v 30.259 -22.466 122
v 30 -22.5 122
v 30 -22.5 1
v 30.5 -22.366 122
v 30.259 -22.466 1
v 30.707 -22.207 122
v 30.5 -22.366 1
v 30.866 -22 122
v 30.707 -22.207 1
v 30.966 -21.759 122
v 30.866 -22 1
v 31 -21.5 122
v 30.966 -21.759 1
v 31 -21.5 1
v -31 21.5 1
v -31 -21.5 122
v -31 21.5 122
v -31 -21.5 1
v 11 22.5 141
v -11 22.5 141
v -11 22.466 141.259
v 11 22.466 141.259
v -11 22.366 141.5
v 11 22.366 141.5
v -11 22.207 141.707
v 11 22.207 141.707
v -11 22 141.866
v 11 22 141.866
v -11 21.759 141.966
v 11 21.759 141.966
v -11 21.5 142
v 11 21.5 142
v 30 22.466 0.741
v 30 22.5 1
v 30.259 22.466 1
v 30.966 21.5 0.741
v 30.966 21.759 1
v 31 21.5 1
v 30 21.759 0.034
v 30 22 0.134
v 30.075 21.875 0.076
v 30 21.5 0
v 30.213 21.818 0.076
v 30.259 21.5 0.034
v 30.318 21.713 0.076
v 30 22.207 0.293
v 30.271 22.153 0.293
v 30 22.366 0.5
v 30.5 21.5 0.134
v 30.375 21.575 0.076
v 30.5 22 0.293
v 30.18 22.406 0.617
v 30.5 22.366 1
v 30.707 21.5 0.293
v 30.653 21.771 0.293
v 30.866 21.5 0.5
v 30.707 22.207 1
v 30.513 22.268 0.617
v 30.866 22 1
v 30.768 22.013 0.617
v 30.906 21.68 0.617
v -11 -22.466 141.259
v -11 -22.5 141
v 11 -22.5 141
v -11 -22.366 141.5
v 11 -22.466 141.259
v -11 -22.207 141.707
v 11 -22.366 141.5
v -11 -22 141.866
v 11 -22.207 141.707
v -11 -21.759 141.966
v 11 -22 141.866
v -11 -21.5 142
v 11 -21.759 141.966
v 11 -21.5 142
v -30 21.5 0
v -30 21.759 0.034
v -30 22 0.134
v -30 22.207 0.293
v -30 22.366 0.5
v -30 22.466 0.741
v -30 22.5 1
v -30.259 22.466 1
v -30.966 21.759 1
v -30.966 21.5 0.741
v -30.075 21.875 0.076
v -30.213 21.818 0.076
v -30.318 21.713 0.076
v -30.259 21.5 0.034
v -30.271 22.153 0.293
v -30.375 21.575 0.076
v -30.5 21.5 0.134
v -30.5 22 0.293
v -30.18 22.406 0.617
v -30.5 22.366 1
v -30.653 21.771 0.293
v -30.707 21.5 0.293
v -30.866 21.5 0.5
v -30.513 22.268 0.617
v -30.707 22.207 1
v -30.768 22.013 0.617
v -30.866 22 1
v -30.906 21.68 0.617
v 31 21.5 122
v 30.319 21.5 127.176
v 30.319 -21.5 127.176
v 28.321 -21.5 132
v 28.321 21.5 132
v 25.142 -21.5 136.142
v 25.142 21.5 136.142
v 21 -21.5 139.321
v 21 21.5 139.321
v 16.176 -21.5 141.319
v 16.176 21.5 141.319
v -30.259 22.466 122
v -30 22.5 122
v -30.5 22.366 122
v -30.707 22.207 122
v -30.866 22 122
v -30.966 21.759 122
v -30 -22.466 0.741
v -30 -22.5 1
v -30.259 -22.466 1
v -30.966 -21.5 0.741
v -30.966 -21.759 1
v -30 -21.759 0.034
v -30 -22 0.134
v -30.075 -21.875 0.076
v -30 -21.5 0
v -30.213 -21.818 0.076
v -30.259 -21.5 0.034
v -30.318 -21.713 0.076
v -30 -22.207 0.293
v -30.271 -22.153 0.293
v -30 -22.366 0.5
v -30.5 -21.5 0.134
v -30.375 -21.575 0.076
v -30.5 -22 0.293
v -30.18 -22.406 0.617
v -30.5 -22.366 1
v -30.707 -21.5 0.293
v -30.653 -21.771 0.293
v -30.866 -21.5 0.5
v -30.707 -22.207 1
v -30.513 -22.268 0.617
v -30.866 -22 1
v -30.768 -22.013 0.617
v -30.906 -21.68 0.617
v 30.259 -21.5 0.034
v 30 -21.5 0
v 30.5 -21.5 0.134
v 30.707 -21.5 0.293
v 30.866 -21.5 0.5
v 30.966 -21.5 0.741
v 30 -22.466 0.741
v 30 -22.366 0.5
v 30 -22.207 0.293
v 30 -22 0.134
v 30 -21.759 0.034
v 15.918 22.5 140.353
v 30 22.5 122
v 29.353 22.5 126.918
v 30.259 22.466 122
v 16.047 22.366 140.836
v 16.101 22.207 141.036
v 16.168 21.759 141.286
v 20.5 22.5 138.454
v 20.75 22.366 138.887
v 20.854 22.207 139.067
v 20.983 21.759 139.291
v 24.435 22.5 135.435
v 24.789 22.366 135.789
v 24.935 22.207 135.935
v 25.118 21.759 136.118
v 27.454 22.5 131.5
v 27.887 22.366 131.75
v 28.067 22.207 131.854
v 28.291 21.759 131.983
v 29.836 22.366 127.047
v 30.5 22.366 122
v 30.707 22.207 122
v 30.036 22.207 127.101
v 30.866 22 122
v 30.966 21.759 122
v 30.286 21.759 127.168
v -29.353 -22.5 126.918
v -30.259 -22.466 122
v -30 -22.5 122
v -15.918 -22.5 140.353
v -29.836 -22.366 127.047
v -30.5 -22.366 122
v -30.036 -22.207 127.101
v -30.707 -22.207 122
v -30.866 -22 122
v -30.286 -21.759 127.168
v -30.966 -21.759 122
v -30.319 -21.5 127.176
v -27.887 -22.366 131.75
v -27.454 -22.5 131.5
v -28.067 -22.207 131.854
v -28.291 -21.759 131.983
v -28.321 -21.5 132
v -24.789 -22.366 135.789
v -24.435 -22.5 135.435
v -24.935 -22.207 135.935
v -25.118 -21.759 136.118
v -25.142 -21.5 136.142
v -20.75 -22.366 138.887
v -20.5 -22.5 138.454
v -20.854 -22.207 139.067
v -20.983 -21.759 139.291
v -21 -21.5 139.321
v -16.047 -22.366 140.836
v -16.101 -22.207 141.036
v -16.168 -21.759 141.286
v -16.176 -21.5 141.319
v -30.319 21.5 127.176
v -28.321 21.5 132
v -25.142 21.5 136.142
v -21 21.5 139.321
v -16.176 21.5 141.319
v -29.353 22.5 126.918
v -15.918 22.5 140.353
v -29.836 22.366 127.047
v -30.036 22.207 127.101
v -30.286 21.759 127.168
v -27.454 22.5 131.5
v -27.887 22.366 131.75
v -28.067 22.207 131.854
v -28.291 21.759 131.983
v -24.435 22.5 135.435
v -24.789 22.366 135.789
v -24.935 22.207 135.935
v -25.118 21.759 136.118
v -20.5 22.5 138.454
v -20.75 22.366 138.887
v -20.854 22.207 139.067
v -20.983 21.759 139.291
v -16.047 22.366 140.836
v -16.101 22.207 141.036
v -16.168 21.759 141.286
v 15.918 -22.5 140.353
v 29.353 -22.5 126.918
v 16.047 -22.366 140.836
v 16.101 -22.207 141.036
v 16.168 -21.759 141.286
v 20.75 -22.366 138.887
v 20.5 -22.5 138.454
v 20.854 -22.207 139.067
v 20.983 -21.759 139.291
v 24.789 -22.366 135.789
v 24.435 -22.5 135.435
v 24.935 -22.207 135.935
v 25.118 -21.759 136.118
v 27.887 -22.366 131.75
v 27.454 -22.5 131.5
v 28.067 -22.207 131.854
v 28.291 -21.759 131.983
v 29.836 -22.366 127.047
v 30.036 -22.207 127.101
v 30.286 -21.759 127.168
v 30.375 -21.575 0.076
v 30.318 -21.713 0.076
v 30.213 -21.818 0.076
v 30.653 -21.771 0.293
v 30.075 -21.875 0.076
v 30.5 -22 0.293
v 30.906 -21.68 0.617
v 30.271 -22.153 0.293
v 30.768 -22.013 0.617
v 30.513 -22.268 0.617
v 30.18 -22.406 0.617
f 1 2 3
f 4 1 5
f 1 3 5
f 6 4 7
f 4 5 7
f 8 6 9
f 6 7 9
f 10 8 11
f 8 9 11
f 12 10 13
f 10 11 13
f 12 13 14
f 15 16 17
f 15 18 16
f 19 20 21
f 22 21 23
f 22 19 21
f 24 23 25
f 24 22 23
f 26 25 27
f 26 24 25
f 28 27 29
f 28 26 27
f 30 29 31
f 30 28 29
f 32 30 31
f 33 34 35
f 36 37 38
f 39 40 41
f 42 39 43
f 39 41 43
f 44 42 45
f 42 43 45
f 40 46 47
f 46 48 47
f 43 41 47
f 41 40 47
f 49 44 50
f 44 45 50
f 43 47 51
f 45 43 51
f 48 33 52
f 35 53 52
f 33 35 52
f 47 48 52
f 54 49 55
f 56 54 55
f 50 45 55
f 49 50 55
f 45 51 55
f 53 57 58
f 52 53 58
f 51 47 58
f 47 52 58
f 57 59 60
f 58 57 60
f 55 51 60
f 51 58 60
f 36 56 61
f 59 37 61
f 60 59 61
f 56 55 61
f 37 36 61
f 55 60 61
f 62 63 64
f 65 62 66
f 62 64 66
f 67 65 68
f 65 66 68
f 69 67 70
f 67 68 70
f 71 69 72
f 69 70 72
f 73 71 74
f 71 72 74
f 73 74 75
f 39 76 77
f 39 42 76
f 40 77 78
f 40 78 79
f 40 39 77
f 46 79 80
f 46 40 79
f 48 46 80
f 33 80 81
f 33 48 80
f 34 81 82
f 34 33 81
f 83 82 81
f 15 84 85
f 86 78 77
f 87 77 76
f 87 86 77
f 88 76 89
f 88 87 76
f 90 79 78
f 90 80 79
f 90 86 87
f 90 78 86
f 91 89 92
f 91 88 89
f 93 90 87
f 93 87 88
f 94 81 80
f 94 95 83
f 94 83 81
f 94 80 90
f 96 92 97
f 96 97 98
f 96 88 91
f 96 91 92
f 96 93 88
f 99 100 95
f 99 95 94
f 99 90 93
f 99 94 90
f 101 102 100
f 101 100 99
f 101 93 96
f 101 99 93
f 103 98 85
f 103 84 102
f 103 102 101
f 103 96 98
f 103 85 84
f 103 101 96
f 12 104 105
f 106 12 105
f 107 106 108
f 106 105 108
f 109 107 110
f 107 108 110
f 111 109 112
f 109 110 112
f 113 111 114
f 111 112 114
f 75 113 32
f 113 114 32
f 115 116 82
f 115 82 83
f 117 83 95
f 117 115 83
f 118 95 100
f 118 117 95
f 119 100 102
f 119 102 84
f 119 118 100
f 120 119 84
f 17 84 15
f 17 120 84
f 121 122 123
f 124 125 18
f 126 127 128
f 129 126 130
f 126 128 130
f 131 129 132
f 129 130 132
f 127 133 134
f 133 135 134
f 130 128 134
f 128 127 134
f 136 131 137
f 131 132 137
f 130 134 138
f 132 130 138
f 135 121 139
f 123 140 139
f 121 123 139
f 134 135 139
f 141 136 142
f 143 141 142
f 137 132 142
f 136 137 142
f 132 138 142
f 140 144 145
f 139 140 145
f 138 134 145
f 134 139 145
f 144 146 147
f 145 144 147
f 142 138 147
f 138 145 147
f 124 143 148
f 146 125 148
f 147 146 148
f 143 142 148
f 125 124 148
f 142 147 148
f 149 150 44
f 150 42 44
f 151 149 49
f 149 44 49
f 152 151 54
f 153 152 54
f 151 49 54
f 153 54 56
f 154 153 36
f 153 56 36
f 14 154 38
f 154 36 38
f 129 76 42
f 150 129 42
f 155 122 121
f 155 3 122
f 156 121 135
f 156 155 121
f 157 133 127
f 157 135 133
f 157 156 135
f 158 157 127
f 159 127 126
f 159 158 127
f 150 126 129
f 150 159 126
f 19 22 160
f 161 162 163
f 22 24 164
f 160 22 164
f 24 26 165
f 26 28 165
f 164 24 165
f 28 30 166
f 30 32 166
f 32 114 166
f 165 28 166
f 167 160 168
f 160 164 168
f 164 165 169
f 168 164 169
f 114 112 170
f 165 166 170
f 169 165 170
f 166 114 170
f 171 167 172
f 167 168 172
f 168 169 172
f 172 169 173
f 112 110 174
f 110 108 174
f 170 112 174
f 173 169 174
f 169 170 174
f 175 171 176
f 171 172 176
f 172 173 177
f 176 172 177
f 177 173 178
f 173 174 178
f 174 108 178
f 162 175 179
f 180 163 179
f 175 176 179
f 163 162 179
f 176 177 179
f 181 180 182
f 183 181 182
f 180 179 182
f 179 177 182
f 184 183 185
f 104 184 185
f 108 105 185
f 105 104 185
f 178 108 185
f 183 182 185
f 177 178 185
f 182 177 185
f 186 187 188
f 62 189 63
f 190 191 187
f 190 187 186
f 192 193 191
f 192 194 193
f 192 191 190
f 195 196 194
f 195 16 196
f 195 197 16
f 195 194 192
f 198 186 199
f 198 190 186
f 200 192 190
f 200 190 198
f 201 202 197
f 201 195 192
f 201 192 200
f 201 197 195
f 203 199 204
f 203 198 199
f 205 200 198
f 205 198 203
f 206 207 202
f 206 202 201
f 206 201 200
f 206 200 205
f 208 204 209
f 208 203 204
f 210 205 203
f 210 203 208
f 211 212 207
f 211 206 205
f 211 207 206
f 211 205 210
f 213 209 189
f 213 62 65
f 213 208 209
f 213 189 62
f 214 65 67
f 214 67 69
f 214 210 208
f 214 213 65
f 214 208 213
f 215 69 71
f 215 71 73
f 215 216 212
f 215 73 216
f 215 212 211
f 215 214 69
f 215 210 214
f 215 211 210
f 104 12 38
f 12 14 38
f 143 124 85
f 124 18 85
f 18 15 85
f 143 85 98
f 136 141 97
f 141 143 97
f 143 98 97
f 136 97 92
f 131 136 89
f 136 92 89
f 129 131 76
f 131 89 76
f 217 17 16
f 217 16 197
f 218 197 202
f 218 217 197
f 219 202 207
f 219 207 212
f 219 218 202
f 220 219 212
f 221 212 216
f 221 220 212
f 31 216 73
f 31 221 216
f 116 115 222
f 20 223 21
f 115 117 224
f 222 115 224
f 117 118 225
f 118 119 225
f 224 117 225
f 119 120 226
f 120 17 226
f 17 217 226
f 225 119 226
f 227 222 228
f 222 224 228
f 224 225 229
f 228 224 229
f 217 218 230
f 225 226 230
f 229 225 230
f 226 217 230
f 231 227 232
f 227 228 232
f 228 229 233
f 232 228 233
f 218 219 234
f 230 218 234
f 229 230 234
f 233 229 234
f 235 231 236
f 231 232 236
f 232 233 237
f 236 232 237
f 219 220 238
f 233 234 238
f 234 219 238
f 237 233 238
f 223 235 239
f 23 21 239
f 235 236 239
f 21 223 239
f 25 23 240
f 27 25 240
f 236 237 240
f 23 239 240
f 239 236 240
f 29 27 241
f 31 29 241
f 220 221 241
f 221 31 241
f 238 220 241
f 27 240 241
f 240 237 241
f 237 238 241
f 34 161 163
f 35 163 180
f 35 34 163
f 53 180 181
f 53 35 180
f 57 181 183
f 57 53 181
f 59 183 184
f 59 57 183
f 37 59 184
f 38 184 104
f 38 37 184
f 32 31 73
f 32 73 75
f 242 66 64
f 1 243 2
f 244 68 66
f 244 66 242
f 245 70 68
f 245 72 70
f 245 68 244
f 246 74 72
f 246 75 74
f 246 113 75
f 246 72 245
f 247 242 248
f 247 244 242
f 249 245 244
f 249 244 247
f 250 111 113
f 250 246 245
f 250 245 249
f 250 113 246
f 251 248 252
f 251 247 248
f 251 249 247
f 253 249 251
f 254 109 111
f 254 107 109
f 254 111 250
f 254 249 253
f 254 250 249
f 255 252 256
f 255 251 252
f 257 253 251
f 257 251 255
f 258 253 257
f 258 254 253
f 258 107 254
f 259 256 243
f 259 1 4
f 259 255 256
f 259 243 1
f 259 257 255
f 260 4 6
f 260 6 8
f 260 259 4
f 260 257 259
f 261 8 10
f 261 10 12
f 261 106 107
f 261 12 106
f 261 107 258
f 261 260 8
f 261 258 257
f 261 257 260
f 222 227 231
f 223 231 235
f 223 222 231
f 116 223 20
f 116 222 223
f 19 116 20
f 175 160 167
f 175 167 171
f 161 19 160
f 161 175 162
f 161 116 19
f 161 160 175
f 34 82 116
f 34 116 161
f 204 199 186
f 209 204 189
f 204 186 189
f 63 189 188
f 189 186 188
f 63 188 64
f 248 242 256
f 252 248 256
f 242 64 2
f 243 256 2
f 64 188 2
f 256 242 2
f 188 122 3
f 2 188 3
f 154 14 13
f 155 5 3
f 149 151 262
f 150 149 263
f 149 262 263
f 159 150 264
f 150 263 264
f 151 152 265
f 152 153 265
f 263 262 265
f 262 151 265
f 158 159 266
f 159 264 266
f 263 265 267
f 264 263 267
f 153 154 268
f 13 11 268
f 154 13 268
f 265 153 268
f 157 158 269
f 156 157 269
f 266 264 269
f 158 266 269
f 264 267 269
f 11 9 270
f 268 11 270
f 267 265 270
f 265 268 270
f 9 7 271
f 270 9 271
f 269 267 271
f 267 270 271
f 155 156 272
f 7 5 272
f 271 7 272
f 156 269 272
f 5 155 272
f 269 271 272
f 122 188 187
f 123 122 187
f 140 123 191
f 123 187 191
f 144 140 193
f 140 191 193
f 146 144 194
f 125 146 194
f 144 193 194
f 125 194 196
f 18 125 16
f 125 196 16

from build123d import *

# Parameters (mm, degrees)
SKETCH1_W           = 62
SKETCH1_H           = 45
BOSS_EXTRUDE1_DEPTH = 142
FILLET1_R           = 20
FILLET2_R           = 1


with BuildPart() as part:
    # Sketch1 → Boss-Extrude1 (new body)
    with BuildSketch(Plane.XY):
        Rectangle(SKETCH1_W, SKETCH1_H)
    extrude(amount=BOSS_EXTRUDE1_DEPTH)

    # Fillet1
    fillet1_edges = [part.edges().sort_by_distance(p)[0] for p in [
        (31, 0, 142),
        (-31, 0, 142),
    ]]
    fillet(fillet1_edges, radius=FILLET1_R)

    # Fillet2
    fillet2_edges = [part.edges().sort_by_distance(p)[0] for p in [
        (0, -22.5, 142),
        (0, 22.5, 142),
        (31, -22.5, 61),
        (-31, -22.5, 61),
        (25.142135624, -22.5, 136.142135624),
        (-25.142135624, -22.5, 136.142135624),
        (-31, 22.5, 61),
        (31, 22.5, 61),
        (25.142135624, 22.5, 136.142135624),
        (-25.142135624, 22.5, 136.142135624),
        (0, 22.5, 0),
        (31, 0, 0),
        (0, -22.5, 0),
        (-31, 0, 0),
    ]]
    fillet(fillet2_edges, radius=FILLET2_R)


solid = part.part
